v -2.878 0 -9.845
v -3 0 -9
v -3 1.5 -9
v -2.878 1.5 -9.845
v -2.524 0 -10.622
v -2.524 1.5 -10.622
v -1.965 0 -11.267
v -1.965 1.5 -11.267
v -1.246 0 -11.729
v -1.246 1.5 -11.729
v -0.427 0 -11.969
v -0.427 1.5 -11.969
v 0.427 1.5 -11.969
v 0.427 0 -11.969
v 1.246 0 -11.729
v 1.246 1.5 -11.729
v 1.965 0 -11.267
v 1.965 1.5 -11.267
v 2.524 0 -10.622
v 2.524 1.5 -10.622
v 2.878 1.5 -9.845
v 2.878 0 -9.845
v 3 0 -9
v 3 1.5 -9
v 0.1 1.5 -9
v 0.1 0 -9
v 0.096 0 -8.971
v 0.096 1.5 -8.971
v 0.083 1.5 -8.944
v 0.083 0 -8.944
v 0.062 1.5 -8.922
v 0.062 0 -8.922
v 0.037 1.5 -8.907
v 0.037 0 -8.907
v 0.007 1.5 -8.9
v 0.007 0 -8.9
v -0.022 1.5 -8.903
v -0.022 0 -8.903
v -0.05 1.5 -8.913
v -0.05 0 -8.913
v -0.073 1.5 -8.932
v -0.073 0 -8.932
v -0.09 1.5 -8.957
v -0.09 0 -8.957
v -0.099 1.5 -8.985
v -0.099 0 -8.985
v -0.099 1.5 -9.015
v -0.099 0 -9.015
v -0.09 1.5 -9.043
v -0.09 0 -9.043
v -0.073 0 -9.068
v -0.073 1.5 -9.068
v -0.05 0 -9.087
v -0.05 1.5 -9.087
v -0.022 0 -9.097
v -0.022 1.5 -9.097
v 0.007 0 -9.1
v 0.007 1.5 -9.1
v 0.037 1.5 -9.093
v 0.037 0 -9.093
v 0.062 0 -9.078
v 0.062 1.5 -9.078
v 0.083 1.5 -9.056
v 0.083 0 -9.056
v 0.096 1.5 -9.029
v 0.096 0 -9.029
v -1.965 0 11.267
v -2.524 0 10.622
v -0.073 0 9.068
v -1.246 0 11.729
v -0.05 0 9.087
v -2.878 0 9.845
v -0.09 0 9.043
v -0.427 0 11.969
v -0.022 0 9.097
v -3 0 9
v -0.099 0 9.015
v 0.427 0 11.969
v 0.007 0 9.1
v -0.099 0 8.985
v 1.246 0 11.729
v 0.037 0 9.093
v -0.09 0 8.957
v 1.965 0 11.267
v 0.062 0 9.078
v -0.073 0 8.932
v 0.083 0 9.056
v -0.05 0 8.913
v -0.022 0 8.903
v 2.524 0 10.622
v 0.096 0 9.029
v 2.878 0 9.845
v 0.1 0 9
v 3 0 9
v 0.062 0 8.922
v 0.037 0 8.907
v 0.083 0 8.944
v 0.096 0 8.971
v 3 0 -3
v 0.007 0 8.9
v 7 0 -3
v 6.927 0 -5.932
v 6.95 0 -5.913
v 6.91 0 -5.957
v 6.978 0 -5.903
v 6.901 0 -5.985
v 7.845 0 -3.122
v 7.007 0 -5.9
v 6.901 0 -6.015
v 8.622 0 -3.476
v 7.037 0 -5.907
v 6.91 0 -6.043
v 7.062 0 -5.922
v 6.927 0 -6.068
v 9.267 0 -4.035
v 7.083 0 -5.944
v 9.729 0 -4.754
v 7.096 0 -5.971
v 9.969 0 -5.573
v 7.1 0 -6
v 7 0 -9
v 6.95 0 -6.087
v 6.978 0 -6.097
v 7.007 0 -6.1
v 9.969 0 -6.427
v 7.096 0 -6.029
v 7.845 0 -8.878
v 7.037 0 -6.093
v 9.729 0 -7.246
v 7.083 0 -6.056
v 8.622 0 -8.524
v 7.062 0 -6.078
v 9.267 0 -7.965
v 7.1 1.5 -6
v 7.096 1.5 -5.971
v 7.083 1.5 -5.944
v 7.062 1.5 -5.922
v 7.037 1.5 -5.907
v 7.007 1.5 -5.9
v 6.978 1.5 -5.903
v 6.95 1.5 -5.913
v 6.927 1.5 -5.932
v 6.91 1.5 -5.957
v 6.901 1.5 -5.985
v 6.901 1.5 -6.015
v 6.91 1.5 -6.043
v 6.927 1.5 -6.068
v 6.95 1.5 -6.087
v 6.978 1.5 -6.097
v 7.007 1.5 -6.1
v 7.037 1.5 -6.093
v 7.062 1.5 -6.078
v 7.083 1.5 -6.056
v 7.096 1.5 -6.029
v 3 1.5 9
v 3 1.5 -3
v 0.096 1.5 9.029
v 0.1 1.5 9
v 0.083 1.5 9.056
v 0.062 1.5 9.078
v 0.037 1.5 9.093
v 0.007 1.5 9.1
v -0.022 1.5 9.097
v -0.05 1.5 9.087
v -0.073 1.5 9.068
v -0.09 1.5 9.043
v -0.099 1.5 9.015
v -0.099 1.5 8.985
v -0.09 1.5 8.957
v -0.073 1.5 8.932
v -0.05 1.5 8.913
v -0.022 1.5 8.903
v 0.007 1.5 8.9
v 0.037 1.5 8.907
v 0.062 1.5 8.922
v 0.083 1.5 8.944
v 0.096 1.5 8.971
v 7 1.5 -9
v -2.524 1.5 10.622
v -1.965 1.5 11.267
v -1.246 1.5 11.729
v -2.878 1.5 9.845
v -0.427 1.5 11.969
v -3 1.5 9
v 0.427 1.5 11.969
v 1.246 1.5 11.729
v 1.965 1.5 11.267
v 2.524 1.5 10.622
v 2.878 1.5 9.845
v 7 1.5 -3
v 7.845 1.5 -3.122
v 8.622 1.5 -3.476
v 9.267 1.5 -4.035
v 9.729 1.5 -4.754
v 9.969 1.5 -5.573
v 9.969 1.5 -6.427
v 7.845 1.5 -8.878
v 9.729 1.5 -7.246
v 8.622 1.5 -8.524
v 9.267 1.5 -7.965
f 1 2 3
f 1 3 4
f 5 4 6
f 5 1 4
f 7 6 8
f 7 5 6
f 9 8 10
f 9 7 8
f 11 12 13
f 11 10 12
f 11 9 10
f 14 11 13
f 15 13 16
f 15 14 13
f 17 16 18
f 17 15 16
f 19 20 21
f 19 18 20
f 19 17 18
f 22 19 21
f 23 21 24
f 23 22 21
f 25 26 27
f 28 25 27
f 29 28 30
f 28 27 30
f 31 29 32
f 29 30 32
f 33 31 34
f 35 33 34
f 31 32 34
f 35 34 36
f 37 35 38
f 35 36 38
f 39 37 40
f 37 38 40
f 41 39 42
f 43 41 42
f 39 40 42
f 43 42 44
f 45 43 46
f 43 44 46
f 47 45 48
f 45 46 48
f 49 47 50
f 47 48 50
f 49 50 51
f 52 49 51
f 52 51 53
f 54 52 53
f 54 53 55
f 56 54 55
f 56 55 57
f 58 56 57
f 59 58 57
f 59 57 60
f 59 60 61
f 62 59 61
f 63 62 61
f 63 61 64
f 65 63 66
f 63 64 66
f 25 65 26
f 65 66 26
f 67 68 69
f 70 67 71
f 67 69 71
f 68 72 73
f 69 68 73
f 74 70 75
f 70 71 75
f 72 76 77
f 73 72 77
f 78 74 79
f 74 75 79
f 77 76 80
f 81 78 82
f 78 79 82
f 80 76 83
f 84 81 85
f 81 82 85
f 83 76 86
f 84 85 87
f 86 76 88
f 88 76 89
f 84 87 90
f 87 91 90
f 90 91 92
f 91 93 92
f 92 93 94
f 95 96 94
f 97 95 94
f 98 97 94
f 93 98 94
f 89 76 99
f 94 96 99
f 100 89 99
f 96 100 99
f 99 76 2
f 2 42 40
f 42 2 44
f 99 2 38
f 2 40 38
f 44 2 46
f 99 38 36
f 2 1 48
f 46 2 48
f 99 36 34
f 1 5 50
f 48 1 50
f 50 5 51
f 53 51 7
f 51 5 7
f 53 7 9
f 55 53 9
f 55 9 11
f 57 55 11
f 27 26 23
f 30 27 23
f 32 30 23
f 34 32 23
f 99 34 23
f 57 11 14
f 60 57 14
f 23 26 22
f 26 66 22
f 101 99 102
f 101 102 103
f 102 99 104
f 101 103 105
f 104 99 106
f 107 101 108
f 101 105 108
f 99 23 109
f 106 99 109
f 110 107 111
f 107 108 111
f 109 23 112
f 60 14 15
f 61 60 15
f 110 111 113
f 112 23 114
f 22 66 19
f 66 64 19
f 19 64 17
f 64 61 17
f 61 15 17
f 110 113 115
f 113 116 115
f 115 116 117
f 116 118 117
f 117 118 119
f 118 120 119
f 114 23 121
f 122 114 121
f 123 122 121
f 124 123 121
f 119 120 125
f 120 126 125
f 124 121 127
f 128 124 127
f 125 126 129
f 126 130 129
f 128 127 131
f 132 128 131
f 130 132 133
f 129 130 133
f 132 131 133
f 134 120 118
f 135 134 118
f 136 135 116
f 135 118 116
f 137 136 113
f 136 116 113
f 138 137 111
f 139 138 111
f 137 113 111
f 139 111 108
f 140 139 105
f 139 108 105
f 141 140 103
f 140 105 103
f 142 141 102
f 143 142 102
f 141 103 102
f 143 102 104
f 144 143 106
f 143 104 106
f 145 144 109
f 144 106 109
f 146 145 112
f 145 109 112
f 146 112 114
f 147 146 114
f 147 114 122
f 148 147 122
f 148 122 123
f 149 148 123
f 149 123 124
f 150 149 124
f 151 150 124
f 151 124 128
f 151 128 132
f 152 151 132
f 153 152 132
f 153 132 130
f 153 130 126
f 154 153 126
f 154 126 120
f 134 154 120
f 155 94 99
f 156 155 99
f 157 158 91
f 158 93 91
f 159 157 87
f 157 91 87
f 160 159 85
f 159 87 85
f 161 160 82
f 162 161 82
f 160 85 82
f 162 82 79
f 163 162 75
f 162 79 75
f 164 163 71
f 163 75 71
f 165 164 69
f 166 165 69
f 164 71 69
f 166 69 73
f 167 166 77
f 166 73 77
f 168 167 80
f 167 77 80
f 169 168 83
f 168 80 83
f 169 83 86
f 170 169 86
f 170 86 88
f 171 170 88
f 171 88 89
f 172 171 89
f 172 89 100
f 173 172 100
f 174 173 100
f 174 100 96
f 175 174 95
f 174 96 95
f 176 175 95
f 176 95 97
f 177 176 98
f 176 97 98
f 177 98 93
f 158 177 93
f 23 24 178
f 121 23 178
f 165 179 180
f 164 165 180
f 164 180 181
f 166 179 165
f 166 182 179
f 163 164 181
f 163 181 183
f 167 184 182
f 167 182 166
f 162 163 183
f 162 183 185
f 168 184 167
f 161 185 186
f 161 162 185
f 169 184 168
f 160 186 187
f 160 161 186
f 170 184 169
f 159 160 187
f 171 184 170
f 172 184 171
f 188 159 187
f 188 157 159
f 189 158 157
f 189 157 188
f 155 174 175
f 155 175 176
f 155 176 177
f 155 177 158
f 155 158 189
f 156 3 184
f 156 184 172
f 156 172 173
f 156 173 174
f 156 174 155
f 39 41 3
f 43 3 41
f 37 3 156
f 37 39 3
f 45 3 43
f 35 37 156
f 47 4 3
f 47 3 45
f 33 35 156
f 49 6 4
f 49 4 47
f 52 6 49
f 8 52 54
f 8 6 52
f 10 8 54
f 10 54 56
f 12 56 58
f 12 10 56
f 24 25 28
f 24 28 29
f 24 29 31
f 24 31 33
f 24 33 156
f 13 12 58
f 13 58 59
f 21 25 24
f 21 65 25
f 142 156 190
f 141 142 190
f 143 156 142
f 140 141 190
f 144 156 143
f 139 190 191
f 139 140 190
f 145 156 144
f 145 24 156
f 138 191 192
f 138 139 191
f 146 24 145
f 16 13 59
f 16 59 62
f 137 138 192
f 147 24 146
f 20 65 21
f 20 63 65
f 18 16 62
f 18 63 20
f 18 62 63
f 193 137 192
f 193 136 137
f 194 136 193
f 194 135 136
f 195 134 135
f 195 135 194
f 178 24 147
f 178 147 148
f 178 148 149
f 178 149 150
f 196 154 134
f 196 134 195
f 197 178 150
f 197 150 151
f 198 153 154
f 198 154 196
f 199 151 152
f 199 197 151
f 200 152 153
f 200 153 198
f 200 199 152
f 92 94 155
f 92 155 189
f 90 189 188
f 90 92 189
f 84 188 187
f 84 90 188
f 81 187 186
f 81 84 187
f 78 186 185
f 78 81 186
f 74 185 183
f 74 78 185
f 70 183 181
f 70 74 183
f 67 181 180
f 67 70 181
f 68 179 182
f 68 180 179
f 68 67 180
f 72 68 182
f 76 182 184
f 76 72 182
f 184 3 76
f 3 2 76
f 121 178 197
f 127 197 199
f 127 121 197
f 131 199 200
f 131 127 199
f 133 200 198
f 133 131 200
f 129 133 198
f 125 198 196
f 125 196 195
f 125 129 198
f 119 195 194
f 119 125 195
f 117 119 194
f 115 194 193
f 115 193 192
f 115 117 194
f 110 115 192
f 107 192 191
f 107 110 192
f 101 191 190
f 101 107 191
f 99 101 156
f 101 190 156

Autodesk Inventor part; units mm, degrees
ref_plane "YZ Plane" through (0, 0, 0) normal (1, 0, 0) x (0, 1, 0)
ref_plane "XZ Plane" through (0, 0, 0) normal (0, 1, 0) x (-1, 0, 0)
ref_plane "XY Plane" through (0, 0, 0) normal (0, 0, 1) x (1, 0, 0)
sketch "Sketch1" plane through (0, 0, 0) normal (0, 1, 0) x (-1, 0, 0)
  line L0 (3, 9) -> (-3, 9)
  line L1 (-3, 9) -> (-3, -9)
  line L2 (-3, -9) -> (3, -9)
  line L3 (3, -9) -> (3, 9)
  line L4 (3, 9) -> (-3, -9) construction
  line L5 (-3, 9) -> (3, -9) construction
  circle A0 centre (0, 9) radius 3
  circle A1 centre (0, -9) radius 3
  line L6 (-3, -9) -> (-7, -9)
  line L7 (-7, -9) -> (-7, -5)
  line L8 (-7, -5) -> (-7, -3)
  line L9 (-7, -3) -> (-3, -3)
  line L10 (-7, -3) -> (-7, -6)
  circle A2 centre (-7, -6) radius 3
  line L11 (-3, -3) -> (-3, -9)
  point P0 (0, 0)
  dimension "d0" = 6
  dimension "d1" = 18
  dimension "d2" = 6
  dimension "d4" = 6
  dimension "d5" = 4
  dimension "d6" = 4
  dimension "d7" = 2
  dimension "d10" = 3
  dimension "d11" = 6
extrude "Extrusion1" add sketch "Sketch1" along normal blind 1.5 contours A0 L0 | L0 A0 | L3 A1 L1 A0 | A1 L2 | L2 A1 | A2 L7 L8 | L8 L7 A2
sketch "Sketch2" plane through (0, 1.5, 0) normal (0, 1, 0) x (1, 0, 0)
  line L0 (3, -9) -> (3, 9) projected
  arc A0 (3, 9) -> (-3, 9) centre (0, 9) ccw projected
  line L1 (-3, 9) -> (-3, -9) projected
  arc A1 (-3, -9) -> (3, -9) centre (0, -9) ccw projected
  circle A2 centre (0, 9) radius 1.5
  circle A3 centre (0, -9) radius 1.5
  line L2 (3, 9) -> (7, 9)
  line L3 (7, 9) -> (7, 3)
  line L4 (7, 3) -> (3, 3)
  line L5 (3, 3) -> (3, 9)
  point P0 (0, 0)
  dimension "d14" = 3
  dimension "d15" = 3
  dimension "d16" = 4
  dimension "d17" = 6
extrude "Extrusion2" cut sketch "Sketch2" against normal blind 1.5 contours L0 L2 L3 L4 | A2 | A3
sketch "Sketch3" plane through (0, 1.5, 0) normal (0, 1, 0) x (1, 0, 0)
  line L0 (3, -9) -> (3, 9) projected
  arc A0 (3, 9) -> (-3, 9) centre (0, 9) ccw projected
  line L1 (-3, 9) -> (-3, -9) projected
  line L2 (3, 9) -> (7, 9)
  line L3 (7, 9) -> (7, 3)
  line L4 (7, 3) -> (3, 3)
  line L5 (3, 3) -> (3, 9)
  point P0 (0, 0)
  dimension "d20" = 4
  dimension "d21" = 6
  dimension "d22" = 4
extrude "Extrusion3" add sketch "Sketch3" against normal blind 1.5
sketch "Sketch4" plane through (0, 1.5, 0) normal (0, 1, 0) x (1, 0, 0)
  arc A0 (7, 3) -> (7, 9) centre (7, 6) ccw projected
  circle A1 centre (7, 6) radius 1.5
  point P0 (0, 0)
  dimension "d25" = 3
extrude "Extrusion4" cut sketch "Sketch4" against normal blind 1.5
sketch "Sketch5" plane through (0, 0, 0) normal (0, -1, 0) x (1, 0, 0)
  circle A0 centre (7, -6) radius 1.5 projected
  circle A1 centre (0, 9) radius 1.5 projected
  circle A2 centre (0, -9) radius 1.5 projected
  arc A3 (7, -9) -> (7, -3) centre (7, -6) ccw projected
  arc A4 (3, 9) -> (-3, 9) centre (0, 9) ccw projected
  arc A5 (-3, -9) -> (3, -9) centre (0, -9) ccw projected
  circle A6 centre (0, 9) radius 0.1
  circle A7 centre (0, -9) radius 0.1
  circle A8 centre (7, -6) radius 0.1
  point P0 (0, 0)
  dimension "d28" = 0.2
  dimension "d29" = 0.2
  dimension "d30" = 0.2
extrude "Extrusion5" add sketch "Sketch5" against normal blind 1.5
properties part number "tahlo3_sablona"
